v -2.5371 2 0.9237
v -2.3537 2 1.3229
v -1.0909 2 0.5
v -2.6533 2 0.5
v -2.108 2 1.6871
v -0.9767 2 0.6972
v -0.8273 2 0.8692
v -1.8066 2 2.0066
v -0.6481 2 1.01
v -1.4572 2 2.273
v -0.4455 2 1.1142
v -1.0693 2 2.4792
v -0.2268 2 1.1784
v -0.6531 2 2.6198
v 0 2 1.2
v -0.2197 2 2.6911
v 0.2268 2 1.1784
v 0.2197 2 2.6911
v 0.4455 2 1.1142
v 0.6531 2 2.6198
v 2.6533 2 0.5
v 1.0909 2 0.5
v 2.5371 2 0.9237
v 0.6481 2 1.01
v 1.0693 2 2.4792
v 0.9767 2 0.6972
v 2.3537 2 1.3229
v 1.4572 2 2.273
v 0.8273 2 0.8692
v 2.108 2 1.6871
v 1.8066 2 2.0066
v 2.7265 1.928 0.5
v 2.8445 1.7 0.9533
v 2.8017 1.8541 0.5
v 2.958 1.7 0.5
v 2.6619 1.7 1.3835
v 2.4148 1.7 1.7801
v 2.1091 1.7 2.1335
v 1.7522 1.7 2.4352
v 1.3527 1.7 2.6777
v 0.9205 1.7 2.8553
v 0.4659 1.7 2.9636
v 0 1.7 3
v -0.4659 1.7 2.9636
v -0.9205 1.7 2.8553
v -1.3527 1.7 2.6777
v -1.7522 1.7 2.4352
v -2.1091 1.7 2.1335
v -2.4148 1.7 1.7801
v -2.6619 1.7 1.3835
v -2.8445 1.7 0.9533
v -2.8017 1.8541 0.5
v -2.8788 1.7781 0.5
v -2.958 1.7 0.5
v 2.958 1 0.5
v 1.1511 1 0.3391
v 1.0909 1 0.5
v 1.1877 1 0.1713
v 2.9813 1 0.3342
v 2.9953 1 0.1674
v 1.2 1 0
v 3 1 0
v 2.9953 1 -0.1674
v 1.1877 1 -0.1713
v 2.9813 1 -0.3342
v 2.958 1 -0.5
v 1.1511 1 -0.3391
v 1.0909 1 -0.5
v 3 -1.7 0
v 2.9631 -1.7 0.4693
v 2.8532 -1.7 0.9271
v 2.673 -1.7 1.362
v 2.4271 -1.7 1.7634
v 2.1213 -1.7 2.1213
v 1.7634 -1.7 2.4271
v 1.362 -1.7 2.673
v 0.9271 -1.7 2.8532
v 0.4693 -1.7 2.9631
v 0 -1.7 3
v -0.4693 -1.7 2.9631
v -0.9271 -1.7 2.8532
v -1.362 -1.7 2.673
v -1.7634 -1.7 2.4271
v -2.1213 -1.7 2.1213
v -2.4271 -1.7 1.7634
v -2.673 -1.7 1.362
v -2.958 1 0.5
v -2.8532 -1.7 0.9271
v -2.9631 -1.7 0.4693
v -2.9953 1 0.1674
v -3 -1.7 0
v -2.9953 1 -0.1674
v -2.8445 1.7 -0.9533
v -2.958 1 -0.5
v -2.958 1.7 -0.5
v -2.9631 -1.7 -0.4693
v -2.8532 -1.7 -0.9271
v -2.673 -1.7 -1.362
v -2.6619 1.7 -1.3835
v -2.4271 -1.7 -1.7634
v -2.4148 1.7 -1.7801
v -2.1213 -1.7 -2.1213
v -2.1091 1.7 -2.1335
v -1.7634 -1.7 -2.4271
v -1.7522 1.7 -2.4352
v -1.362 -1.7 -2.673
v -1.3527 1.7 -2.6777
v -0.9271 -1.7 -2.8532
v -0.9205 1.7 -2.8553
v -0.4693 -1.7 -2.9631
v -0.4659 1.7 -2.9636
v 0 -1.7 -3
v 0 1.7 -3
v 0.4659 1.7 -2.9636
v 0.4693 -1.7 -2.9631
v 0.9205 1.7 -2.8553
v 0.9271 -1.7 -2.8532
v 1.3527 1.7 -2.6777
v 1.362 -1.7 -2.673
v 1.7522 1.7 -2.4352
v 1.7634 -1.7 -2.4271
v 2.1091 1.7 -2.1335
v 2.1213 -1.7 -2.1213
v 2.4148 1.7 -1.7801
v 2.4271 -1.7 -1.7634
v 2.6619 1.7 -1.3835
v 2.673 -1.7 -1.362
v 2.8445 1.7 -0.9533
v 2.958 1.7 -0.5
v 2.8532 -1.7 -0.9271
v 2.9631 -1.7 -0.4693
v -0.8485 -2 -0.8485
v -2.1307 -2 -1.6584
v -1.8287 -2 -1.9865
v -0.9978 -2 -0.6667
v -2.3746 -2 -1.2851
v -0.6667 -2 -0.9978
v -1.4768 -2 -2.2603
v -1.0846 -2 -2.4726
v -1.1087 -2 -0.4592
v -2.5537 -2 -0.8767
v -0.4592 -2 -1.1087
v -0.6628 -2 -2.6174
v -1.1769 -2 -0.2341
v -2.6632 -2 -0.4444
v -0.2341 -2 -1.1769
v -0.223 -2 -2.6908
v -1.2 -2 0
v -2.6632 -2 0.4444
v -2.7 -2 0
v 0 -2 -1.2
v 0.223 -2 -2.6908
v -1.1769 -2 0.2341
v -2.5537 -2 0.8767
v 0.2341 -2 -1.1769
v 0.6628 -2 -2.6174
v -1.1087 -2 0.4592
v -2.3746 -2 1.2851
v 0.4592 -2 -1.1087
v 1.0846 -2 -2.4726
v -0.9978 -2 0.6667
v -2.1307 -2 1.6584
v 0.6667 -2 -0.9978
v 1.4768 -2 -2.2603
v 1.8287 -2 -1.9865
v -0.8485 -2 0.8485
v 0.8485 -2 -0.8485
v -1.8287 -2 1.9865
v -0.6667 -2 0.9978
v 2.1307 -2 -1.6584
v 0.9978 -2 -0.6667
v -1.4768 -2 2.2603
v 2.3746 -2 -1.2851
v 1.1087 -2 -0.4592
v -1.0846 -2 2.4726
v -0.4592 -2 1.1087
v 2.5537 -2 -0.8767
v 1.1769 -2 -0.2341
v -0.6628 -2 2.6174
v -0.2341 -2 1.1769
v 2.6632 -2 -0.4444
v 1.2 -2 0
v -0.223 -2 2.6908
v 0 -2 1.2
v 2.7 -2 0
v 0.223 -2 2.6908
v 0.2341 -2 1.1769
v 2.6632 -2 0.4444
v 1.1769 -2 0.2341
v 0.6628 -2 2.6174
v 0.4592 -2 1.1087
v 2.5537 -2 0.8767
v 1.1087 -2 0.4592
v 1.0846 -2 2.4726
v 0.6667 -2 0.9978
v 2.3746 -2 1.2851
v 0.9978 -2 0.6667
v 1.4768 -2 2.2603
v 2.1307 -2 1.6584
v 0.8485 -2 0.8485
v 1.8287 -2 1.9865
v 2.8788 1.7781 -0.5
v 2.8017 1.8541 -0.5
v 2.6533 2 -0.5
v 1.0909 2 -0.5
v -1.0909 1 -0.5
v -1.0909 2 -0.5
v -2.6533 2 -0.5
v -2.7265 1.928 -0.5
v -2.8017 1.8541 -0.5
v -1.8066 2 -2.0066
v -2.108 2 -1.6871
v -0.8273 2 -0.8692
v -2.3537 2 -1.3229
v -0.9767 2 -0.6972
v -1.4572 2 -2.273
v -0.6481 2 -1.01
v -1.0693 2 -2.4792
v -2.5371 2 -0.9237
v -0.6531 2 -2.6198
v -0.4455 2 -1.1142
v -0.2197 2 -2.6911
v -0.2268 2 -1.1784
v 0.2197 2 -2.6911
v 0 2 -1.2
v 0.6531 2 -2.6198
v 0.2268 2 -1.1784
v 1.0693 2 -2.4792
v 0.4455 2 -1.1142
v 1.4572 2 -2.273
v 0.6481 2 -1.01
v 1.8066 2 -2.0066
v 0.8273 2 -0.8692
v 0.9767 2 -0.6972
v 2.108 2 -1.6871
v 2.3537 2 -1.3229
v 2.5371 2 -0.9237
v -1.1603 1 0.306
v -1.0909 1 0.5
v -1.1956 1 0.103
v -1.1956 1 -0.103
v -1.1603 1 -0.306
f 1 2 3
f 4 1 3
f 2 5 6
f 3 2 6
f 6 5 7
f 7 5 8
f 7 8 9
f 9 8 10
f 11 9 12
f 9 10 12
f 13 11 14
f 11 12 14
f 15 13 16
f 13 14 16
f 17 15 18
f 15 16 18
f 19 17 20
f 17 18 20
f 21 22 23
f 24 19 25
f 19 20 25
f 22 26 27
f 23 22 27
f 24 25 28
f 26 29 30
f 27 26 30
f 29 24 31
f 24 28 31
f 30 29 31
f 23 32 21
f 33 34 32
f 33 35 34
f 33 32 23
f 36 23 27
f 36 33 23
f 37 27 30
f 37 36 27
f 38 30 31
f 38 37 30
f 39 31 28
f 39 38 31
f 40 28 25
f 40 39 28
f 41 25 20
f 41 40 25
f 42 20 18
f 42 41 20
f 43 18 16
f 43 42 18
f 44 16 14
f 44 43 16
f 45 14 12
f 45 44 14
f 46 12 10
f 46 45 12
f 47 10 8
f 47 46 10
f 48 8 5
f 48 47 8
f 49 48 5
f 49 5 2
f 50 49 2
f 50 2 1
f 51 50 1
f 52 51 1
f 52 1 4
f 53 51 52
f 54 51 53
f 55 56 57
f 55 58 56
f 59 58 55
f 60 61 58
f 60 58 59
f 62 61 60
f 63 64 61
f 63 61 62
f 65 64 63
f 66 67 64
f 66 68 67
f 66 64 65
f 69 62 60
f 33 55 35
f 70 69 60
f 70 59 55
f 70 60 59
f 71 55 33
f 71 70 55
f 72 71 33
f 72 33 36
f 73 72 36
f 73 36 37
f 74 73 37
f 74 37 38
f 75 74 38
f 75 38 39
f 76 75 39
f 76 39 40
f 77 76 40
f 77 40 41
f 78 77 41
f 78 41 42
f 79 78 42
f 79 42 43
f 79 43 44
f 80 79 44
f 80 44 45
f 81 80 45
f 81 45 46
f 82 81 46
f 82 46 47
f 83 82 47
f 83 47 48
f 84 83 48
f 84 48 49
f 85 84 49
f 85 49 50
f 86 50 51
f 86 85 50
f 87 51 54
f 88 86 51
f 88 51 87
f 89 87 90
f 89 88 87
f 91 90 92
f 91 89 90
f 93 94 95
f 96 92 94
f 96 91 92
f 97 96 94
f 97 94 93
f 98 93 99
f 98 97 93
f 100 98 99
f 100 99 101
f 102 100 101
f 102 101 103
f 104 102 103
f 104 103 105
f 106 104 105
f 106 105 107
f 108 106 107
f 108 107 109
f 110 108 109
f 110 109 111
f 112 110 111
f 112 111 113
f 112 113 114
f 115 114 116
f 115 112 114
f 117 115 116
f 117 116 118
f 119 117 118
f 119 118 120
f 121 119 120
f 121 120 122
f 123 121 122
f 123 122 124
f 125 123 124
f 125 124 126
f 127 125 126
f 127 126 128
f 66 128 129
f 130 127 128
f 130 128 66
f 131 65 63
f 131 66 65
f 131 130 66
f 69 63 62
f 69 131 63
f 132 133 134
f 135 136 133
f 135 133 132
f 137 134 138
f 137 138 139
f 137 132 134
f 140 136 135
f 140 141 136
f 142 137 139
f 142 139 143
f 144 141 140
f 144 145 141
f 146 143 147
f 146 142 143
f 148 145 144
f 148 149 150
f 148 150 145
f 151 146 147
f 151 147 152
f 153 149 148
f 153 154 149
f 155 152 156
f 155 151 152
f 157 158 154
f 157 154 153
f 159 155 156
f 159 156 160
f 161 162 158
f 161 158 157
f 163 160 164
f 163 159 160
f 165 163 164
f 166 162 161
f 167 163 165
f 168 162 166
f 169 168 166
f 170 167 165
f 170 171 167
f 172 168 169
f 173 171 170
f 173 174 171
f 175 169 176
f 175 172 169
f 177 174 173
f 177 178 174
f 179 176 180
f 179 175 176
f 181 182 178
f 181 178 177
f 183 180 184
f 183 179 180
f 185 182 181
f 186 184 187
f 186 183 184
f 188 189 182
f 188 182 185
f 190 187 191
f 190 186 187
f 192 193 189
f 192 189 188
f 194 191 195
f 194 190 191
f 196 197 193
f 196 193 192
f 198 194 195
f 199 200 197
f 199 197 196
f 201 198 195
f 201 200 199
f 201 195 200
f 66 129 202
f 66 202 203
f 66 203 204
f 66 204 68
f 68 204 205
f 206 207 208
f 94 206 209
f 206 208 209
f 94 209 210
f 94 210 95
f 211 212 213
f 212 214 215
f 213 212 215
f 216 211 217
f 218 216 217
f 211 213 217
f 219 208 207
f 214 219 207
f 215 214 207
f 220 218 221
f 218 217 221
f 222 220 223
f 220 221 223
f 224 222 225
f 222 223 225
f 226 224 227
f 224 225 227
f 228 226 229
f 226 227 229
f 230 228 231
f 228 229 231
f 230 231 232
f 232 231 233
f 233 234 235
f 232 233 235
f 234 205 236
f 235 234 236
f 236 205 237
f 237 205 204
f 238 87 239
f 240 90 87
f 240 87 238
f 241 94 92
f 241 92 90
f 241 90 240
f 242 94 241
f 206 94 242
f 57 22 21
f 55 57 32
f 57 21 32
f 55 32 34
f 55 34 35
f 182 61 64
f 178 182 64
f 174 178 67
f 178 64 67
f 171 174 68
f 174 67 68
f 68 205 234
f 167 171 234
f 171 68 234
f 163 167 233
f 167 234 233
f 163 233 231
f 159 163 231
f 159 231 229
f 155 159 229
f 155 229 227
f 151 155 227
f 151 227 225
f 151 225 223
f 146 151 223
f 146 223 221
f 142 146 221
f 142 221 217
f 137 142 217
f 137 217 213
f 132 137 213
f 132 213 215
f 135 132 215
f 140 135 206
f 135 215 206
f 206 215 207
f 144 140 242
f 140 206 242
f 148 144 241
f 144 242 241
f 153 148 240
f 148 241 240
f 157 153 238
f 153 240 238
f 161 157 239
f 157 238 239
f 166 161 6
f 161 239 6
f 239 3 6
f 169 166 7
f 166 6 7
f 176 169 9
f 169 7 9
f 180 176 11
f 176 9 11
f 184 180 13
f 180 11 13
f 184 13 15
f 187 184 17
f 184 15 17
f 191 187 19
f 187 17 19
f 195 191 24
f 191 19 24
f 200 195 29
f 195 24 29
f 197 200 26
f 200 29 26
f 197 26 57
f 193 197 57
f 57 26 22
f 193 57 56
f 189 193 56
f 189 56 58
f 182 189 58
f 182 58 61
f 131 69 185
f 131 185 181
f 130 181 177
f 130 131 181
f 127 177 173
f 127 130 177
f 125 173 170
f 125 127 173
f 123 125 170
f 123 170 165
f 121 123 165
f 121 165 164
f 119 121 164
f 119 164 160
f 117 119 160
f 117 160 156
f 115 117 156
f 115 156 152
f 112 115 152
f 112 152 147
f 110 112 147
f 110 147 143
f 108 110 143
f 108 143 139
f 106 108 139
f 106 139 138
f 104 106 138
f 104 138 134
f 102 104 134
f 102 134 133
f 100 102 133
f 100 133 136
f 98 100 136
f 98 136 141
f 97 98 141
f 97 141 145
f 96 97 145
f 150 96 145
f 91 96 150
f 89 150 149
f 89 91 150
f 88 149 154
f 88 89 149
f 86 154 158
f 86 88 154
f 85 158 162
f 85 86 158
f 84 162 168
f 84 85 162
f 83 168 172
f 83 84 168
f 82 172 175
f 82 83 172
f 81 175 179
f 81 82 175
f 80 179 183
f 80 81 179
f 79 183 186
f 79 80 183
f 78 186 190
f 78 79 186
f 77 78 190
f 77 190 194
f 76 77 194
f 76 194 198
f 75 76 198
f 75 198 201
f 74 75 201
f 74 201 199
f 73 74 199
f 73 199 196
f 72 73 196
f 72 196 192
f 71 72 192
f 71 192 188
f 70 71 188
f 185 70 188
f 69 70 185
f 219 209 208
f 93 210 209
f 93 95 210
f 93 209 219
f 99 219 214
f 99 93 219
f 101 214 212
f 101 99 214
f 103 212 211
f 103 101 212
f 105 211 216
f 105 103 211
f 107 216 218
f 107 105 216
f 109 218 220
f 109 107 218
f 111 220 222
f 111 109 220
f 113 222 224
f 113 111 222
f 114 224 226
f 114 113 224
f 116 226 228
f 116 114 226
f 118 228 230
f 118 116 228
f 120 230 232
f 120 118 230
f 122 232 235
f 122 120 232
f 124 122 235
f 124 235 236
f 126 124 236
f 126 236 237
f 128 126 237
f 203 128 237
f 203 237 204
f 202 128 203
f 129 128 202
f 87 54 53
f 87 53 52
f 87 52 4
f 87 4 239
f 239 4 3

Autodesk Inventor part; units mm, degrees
ref_plane "YZ Plane" through (0, 0, 0) normal (1, 0, 0) x (0, 1, 0)
ref_plane "XZ Plane" through (0, 0, 0) normal (0, 1, 0) x (-1, 0, 0)
ref_plane "XY Plane" through (0, 0, 0) normal (0, 0, 1) x (1, 0, 0)
sketch "スケッチ1" plane through (0, 0, 0) normal (0, 0, 1) x (1, 0, 0)
  line L0 (1.2, -2) -> (1.2, 2)
  line L1 (1.2, 2) -> (2.7, 2)
  line L2 (2.7, 2) -> (3, 1.7)
  line L3 (3, 1.7) -> (3, -1.7)
  line L4 (0, 6.4765) -> (0, -6.4765) construction
  line L5 (3, -1.7) -> (2.7, -2)
  line L6 (2.7, -2) -> (1.2, -2)
  point P0 (0, 0)
  point P1 (0, 0)
  point P2 (0, 0)
  point P3 (1.2, 0)
  point P4 (3, 0)
  dimension "d0" = 6
  dimension "d1" = 2.4
  dimension "d2" = 4
  dimension "d3" = 0.3
  dimension "d4" = 0.3
revolve "回転1" add sketch "スケッチ1" angle 360 about axis through (0, 6.4765, 0) along (0, -1, 0)
sketch "スケッチ2" plane through (0, 2, 0) normal (0, 1, 0) x (1, 0, 0)
  line L0 (-3, -0.5) -> (3, -0.5)
  line L1 (3, -0.5) -> (3, 0.5)
  line L2 (3, 0.5) -> (-3, 0.5)
  line L3 (-3, 0.5) -> (-3, -0.5)
  line L4 (-3, -0.5) -> (3, 0.5) construction
  line L5 (3, -0.5) -> (-3, 0.5) construction
  circle A0 centre (0, 0) radius 3 projected
  point P0 (0, 0)
  point P1 (2.958, -0.5)
  point P2 (2.958, 0.5)
  point P3 (-2.958, 0.5)
  point P4 (-2.958, -0.5)
  dimension "d6" = 1
extrude "押し出し1" cut sketch "スケッチ2" against normal blind 1 contours A0 L2 L0
equation "\"d4\" = d3"
properties part number "ARU-304S" material "ステンレス鋼 440C"
